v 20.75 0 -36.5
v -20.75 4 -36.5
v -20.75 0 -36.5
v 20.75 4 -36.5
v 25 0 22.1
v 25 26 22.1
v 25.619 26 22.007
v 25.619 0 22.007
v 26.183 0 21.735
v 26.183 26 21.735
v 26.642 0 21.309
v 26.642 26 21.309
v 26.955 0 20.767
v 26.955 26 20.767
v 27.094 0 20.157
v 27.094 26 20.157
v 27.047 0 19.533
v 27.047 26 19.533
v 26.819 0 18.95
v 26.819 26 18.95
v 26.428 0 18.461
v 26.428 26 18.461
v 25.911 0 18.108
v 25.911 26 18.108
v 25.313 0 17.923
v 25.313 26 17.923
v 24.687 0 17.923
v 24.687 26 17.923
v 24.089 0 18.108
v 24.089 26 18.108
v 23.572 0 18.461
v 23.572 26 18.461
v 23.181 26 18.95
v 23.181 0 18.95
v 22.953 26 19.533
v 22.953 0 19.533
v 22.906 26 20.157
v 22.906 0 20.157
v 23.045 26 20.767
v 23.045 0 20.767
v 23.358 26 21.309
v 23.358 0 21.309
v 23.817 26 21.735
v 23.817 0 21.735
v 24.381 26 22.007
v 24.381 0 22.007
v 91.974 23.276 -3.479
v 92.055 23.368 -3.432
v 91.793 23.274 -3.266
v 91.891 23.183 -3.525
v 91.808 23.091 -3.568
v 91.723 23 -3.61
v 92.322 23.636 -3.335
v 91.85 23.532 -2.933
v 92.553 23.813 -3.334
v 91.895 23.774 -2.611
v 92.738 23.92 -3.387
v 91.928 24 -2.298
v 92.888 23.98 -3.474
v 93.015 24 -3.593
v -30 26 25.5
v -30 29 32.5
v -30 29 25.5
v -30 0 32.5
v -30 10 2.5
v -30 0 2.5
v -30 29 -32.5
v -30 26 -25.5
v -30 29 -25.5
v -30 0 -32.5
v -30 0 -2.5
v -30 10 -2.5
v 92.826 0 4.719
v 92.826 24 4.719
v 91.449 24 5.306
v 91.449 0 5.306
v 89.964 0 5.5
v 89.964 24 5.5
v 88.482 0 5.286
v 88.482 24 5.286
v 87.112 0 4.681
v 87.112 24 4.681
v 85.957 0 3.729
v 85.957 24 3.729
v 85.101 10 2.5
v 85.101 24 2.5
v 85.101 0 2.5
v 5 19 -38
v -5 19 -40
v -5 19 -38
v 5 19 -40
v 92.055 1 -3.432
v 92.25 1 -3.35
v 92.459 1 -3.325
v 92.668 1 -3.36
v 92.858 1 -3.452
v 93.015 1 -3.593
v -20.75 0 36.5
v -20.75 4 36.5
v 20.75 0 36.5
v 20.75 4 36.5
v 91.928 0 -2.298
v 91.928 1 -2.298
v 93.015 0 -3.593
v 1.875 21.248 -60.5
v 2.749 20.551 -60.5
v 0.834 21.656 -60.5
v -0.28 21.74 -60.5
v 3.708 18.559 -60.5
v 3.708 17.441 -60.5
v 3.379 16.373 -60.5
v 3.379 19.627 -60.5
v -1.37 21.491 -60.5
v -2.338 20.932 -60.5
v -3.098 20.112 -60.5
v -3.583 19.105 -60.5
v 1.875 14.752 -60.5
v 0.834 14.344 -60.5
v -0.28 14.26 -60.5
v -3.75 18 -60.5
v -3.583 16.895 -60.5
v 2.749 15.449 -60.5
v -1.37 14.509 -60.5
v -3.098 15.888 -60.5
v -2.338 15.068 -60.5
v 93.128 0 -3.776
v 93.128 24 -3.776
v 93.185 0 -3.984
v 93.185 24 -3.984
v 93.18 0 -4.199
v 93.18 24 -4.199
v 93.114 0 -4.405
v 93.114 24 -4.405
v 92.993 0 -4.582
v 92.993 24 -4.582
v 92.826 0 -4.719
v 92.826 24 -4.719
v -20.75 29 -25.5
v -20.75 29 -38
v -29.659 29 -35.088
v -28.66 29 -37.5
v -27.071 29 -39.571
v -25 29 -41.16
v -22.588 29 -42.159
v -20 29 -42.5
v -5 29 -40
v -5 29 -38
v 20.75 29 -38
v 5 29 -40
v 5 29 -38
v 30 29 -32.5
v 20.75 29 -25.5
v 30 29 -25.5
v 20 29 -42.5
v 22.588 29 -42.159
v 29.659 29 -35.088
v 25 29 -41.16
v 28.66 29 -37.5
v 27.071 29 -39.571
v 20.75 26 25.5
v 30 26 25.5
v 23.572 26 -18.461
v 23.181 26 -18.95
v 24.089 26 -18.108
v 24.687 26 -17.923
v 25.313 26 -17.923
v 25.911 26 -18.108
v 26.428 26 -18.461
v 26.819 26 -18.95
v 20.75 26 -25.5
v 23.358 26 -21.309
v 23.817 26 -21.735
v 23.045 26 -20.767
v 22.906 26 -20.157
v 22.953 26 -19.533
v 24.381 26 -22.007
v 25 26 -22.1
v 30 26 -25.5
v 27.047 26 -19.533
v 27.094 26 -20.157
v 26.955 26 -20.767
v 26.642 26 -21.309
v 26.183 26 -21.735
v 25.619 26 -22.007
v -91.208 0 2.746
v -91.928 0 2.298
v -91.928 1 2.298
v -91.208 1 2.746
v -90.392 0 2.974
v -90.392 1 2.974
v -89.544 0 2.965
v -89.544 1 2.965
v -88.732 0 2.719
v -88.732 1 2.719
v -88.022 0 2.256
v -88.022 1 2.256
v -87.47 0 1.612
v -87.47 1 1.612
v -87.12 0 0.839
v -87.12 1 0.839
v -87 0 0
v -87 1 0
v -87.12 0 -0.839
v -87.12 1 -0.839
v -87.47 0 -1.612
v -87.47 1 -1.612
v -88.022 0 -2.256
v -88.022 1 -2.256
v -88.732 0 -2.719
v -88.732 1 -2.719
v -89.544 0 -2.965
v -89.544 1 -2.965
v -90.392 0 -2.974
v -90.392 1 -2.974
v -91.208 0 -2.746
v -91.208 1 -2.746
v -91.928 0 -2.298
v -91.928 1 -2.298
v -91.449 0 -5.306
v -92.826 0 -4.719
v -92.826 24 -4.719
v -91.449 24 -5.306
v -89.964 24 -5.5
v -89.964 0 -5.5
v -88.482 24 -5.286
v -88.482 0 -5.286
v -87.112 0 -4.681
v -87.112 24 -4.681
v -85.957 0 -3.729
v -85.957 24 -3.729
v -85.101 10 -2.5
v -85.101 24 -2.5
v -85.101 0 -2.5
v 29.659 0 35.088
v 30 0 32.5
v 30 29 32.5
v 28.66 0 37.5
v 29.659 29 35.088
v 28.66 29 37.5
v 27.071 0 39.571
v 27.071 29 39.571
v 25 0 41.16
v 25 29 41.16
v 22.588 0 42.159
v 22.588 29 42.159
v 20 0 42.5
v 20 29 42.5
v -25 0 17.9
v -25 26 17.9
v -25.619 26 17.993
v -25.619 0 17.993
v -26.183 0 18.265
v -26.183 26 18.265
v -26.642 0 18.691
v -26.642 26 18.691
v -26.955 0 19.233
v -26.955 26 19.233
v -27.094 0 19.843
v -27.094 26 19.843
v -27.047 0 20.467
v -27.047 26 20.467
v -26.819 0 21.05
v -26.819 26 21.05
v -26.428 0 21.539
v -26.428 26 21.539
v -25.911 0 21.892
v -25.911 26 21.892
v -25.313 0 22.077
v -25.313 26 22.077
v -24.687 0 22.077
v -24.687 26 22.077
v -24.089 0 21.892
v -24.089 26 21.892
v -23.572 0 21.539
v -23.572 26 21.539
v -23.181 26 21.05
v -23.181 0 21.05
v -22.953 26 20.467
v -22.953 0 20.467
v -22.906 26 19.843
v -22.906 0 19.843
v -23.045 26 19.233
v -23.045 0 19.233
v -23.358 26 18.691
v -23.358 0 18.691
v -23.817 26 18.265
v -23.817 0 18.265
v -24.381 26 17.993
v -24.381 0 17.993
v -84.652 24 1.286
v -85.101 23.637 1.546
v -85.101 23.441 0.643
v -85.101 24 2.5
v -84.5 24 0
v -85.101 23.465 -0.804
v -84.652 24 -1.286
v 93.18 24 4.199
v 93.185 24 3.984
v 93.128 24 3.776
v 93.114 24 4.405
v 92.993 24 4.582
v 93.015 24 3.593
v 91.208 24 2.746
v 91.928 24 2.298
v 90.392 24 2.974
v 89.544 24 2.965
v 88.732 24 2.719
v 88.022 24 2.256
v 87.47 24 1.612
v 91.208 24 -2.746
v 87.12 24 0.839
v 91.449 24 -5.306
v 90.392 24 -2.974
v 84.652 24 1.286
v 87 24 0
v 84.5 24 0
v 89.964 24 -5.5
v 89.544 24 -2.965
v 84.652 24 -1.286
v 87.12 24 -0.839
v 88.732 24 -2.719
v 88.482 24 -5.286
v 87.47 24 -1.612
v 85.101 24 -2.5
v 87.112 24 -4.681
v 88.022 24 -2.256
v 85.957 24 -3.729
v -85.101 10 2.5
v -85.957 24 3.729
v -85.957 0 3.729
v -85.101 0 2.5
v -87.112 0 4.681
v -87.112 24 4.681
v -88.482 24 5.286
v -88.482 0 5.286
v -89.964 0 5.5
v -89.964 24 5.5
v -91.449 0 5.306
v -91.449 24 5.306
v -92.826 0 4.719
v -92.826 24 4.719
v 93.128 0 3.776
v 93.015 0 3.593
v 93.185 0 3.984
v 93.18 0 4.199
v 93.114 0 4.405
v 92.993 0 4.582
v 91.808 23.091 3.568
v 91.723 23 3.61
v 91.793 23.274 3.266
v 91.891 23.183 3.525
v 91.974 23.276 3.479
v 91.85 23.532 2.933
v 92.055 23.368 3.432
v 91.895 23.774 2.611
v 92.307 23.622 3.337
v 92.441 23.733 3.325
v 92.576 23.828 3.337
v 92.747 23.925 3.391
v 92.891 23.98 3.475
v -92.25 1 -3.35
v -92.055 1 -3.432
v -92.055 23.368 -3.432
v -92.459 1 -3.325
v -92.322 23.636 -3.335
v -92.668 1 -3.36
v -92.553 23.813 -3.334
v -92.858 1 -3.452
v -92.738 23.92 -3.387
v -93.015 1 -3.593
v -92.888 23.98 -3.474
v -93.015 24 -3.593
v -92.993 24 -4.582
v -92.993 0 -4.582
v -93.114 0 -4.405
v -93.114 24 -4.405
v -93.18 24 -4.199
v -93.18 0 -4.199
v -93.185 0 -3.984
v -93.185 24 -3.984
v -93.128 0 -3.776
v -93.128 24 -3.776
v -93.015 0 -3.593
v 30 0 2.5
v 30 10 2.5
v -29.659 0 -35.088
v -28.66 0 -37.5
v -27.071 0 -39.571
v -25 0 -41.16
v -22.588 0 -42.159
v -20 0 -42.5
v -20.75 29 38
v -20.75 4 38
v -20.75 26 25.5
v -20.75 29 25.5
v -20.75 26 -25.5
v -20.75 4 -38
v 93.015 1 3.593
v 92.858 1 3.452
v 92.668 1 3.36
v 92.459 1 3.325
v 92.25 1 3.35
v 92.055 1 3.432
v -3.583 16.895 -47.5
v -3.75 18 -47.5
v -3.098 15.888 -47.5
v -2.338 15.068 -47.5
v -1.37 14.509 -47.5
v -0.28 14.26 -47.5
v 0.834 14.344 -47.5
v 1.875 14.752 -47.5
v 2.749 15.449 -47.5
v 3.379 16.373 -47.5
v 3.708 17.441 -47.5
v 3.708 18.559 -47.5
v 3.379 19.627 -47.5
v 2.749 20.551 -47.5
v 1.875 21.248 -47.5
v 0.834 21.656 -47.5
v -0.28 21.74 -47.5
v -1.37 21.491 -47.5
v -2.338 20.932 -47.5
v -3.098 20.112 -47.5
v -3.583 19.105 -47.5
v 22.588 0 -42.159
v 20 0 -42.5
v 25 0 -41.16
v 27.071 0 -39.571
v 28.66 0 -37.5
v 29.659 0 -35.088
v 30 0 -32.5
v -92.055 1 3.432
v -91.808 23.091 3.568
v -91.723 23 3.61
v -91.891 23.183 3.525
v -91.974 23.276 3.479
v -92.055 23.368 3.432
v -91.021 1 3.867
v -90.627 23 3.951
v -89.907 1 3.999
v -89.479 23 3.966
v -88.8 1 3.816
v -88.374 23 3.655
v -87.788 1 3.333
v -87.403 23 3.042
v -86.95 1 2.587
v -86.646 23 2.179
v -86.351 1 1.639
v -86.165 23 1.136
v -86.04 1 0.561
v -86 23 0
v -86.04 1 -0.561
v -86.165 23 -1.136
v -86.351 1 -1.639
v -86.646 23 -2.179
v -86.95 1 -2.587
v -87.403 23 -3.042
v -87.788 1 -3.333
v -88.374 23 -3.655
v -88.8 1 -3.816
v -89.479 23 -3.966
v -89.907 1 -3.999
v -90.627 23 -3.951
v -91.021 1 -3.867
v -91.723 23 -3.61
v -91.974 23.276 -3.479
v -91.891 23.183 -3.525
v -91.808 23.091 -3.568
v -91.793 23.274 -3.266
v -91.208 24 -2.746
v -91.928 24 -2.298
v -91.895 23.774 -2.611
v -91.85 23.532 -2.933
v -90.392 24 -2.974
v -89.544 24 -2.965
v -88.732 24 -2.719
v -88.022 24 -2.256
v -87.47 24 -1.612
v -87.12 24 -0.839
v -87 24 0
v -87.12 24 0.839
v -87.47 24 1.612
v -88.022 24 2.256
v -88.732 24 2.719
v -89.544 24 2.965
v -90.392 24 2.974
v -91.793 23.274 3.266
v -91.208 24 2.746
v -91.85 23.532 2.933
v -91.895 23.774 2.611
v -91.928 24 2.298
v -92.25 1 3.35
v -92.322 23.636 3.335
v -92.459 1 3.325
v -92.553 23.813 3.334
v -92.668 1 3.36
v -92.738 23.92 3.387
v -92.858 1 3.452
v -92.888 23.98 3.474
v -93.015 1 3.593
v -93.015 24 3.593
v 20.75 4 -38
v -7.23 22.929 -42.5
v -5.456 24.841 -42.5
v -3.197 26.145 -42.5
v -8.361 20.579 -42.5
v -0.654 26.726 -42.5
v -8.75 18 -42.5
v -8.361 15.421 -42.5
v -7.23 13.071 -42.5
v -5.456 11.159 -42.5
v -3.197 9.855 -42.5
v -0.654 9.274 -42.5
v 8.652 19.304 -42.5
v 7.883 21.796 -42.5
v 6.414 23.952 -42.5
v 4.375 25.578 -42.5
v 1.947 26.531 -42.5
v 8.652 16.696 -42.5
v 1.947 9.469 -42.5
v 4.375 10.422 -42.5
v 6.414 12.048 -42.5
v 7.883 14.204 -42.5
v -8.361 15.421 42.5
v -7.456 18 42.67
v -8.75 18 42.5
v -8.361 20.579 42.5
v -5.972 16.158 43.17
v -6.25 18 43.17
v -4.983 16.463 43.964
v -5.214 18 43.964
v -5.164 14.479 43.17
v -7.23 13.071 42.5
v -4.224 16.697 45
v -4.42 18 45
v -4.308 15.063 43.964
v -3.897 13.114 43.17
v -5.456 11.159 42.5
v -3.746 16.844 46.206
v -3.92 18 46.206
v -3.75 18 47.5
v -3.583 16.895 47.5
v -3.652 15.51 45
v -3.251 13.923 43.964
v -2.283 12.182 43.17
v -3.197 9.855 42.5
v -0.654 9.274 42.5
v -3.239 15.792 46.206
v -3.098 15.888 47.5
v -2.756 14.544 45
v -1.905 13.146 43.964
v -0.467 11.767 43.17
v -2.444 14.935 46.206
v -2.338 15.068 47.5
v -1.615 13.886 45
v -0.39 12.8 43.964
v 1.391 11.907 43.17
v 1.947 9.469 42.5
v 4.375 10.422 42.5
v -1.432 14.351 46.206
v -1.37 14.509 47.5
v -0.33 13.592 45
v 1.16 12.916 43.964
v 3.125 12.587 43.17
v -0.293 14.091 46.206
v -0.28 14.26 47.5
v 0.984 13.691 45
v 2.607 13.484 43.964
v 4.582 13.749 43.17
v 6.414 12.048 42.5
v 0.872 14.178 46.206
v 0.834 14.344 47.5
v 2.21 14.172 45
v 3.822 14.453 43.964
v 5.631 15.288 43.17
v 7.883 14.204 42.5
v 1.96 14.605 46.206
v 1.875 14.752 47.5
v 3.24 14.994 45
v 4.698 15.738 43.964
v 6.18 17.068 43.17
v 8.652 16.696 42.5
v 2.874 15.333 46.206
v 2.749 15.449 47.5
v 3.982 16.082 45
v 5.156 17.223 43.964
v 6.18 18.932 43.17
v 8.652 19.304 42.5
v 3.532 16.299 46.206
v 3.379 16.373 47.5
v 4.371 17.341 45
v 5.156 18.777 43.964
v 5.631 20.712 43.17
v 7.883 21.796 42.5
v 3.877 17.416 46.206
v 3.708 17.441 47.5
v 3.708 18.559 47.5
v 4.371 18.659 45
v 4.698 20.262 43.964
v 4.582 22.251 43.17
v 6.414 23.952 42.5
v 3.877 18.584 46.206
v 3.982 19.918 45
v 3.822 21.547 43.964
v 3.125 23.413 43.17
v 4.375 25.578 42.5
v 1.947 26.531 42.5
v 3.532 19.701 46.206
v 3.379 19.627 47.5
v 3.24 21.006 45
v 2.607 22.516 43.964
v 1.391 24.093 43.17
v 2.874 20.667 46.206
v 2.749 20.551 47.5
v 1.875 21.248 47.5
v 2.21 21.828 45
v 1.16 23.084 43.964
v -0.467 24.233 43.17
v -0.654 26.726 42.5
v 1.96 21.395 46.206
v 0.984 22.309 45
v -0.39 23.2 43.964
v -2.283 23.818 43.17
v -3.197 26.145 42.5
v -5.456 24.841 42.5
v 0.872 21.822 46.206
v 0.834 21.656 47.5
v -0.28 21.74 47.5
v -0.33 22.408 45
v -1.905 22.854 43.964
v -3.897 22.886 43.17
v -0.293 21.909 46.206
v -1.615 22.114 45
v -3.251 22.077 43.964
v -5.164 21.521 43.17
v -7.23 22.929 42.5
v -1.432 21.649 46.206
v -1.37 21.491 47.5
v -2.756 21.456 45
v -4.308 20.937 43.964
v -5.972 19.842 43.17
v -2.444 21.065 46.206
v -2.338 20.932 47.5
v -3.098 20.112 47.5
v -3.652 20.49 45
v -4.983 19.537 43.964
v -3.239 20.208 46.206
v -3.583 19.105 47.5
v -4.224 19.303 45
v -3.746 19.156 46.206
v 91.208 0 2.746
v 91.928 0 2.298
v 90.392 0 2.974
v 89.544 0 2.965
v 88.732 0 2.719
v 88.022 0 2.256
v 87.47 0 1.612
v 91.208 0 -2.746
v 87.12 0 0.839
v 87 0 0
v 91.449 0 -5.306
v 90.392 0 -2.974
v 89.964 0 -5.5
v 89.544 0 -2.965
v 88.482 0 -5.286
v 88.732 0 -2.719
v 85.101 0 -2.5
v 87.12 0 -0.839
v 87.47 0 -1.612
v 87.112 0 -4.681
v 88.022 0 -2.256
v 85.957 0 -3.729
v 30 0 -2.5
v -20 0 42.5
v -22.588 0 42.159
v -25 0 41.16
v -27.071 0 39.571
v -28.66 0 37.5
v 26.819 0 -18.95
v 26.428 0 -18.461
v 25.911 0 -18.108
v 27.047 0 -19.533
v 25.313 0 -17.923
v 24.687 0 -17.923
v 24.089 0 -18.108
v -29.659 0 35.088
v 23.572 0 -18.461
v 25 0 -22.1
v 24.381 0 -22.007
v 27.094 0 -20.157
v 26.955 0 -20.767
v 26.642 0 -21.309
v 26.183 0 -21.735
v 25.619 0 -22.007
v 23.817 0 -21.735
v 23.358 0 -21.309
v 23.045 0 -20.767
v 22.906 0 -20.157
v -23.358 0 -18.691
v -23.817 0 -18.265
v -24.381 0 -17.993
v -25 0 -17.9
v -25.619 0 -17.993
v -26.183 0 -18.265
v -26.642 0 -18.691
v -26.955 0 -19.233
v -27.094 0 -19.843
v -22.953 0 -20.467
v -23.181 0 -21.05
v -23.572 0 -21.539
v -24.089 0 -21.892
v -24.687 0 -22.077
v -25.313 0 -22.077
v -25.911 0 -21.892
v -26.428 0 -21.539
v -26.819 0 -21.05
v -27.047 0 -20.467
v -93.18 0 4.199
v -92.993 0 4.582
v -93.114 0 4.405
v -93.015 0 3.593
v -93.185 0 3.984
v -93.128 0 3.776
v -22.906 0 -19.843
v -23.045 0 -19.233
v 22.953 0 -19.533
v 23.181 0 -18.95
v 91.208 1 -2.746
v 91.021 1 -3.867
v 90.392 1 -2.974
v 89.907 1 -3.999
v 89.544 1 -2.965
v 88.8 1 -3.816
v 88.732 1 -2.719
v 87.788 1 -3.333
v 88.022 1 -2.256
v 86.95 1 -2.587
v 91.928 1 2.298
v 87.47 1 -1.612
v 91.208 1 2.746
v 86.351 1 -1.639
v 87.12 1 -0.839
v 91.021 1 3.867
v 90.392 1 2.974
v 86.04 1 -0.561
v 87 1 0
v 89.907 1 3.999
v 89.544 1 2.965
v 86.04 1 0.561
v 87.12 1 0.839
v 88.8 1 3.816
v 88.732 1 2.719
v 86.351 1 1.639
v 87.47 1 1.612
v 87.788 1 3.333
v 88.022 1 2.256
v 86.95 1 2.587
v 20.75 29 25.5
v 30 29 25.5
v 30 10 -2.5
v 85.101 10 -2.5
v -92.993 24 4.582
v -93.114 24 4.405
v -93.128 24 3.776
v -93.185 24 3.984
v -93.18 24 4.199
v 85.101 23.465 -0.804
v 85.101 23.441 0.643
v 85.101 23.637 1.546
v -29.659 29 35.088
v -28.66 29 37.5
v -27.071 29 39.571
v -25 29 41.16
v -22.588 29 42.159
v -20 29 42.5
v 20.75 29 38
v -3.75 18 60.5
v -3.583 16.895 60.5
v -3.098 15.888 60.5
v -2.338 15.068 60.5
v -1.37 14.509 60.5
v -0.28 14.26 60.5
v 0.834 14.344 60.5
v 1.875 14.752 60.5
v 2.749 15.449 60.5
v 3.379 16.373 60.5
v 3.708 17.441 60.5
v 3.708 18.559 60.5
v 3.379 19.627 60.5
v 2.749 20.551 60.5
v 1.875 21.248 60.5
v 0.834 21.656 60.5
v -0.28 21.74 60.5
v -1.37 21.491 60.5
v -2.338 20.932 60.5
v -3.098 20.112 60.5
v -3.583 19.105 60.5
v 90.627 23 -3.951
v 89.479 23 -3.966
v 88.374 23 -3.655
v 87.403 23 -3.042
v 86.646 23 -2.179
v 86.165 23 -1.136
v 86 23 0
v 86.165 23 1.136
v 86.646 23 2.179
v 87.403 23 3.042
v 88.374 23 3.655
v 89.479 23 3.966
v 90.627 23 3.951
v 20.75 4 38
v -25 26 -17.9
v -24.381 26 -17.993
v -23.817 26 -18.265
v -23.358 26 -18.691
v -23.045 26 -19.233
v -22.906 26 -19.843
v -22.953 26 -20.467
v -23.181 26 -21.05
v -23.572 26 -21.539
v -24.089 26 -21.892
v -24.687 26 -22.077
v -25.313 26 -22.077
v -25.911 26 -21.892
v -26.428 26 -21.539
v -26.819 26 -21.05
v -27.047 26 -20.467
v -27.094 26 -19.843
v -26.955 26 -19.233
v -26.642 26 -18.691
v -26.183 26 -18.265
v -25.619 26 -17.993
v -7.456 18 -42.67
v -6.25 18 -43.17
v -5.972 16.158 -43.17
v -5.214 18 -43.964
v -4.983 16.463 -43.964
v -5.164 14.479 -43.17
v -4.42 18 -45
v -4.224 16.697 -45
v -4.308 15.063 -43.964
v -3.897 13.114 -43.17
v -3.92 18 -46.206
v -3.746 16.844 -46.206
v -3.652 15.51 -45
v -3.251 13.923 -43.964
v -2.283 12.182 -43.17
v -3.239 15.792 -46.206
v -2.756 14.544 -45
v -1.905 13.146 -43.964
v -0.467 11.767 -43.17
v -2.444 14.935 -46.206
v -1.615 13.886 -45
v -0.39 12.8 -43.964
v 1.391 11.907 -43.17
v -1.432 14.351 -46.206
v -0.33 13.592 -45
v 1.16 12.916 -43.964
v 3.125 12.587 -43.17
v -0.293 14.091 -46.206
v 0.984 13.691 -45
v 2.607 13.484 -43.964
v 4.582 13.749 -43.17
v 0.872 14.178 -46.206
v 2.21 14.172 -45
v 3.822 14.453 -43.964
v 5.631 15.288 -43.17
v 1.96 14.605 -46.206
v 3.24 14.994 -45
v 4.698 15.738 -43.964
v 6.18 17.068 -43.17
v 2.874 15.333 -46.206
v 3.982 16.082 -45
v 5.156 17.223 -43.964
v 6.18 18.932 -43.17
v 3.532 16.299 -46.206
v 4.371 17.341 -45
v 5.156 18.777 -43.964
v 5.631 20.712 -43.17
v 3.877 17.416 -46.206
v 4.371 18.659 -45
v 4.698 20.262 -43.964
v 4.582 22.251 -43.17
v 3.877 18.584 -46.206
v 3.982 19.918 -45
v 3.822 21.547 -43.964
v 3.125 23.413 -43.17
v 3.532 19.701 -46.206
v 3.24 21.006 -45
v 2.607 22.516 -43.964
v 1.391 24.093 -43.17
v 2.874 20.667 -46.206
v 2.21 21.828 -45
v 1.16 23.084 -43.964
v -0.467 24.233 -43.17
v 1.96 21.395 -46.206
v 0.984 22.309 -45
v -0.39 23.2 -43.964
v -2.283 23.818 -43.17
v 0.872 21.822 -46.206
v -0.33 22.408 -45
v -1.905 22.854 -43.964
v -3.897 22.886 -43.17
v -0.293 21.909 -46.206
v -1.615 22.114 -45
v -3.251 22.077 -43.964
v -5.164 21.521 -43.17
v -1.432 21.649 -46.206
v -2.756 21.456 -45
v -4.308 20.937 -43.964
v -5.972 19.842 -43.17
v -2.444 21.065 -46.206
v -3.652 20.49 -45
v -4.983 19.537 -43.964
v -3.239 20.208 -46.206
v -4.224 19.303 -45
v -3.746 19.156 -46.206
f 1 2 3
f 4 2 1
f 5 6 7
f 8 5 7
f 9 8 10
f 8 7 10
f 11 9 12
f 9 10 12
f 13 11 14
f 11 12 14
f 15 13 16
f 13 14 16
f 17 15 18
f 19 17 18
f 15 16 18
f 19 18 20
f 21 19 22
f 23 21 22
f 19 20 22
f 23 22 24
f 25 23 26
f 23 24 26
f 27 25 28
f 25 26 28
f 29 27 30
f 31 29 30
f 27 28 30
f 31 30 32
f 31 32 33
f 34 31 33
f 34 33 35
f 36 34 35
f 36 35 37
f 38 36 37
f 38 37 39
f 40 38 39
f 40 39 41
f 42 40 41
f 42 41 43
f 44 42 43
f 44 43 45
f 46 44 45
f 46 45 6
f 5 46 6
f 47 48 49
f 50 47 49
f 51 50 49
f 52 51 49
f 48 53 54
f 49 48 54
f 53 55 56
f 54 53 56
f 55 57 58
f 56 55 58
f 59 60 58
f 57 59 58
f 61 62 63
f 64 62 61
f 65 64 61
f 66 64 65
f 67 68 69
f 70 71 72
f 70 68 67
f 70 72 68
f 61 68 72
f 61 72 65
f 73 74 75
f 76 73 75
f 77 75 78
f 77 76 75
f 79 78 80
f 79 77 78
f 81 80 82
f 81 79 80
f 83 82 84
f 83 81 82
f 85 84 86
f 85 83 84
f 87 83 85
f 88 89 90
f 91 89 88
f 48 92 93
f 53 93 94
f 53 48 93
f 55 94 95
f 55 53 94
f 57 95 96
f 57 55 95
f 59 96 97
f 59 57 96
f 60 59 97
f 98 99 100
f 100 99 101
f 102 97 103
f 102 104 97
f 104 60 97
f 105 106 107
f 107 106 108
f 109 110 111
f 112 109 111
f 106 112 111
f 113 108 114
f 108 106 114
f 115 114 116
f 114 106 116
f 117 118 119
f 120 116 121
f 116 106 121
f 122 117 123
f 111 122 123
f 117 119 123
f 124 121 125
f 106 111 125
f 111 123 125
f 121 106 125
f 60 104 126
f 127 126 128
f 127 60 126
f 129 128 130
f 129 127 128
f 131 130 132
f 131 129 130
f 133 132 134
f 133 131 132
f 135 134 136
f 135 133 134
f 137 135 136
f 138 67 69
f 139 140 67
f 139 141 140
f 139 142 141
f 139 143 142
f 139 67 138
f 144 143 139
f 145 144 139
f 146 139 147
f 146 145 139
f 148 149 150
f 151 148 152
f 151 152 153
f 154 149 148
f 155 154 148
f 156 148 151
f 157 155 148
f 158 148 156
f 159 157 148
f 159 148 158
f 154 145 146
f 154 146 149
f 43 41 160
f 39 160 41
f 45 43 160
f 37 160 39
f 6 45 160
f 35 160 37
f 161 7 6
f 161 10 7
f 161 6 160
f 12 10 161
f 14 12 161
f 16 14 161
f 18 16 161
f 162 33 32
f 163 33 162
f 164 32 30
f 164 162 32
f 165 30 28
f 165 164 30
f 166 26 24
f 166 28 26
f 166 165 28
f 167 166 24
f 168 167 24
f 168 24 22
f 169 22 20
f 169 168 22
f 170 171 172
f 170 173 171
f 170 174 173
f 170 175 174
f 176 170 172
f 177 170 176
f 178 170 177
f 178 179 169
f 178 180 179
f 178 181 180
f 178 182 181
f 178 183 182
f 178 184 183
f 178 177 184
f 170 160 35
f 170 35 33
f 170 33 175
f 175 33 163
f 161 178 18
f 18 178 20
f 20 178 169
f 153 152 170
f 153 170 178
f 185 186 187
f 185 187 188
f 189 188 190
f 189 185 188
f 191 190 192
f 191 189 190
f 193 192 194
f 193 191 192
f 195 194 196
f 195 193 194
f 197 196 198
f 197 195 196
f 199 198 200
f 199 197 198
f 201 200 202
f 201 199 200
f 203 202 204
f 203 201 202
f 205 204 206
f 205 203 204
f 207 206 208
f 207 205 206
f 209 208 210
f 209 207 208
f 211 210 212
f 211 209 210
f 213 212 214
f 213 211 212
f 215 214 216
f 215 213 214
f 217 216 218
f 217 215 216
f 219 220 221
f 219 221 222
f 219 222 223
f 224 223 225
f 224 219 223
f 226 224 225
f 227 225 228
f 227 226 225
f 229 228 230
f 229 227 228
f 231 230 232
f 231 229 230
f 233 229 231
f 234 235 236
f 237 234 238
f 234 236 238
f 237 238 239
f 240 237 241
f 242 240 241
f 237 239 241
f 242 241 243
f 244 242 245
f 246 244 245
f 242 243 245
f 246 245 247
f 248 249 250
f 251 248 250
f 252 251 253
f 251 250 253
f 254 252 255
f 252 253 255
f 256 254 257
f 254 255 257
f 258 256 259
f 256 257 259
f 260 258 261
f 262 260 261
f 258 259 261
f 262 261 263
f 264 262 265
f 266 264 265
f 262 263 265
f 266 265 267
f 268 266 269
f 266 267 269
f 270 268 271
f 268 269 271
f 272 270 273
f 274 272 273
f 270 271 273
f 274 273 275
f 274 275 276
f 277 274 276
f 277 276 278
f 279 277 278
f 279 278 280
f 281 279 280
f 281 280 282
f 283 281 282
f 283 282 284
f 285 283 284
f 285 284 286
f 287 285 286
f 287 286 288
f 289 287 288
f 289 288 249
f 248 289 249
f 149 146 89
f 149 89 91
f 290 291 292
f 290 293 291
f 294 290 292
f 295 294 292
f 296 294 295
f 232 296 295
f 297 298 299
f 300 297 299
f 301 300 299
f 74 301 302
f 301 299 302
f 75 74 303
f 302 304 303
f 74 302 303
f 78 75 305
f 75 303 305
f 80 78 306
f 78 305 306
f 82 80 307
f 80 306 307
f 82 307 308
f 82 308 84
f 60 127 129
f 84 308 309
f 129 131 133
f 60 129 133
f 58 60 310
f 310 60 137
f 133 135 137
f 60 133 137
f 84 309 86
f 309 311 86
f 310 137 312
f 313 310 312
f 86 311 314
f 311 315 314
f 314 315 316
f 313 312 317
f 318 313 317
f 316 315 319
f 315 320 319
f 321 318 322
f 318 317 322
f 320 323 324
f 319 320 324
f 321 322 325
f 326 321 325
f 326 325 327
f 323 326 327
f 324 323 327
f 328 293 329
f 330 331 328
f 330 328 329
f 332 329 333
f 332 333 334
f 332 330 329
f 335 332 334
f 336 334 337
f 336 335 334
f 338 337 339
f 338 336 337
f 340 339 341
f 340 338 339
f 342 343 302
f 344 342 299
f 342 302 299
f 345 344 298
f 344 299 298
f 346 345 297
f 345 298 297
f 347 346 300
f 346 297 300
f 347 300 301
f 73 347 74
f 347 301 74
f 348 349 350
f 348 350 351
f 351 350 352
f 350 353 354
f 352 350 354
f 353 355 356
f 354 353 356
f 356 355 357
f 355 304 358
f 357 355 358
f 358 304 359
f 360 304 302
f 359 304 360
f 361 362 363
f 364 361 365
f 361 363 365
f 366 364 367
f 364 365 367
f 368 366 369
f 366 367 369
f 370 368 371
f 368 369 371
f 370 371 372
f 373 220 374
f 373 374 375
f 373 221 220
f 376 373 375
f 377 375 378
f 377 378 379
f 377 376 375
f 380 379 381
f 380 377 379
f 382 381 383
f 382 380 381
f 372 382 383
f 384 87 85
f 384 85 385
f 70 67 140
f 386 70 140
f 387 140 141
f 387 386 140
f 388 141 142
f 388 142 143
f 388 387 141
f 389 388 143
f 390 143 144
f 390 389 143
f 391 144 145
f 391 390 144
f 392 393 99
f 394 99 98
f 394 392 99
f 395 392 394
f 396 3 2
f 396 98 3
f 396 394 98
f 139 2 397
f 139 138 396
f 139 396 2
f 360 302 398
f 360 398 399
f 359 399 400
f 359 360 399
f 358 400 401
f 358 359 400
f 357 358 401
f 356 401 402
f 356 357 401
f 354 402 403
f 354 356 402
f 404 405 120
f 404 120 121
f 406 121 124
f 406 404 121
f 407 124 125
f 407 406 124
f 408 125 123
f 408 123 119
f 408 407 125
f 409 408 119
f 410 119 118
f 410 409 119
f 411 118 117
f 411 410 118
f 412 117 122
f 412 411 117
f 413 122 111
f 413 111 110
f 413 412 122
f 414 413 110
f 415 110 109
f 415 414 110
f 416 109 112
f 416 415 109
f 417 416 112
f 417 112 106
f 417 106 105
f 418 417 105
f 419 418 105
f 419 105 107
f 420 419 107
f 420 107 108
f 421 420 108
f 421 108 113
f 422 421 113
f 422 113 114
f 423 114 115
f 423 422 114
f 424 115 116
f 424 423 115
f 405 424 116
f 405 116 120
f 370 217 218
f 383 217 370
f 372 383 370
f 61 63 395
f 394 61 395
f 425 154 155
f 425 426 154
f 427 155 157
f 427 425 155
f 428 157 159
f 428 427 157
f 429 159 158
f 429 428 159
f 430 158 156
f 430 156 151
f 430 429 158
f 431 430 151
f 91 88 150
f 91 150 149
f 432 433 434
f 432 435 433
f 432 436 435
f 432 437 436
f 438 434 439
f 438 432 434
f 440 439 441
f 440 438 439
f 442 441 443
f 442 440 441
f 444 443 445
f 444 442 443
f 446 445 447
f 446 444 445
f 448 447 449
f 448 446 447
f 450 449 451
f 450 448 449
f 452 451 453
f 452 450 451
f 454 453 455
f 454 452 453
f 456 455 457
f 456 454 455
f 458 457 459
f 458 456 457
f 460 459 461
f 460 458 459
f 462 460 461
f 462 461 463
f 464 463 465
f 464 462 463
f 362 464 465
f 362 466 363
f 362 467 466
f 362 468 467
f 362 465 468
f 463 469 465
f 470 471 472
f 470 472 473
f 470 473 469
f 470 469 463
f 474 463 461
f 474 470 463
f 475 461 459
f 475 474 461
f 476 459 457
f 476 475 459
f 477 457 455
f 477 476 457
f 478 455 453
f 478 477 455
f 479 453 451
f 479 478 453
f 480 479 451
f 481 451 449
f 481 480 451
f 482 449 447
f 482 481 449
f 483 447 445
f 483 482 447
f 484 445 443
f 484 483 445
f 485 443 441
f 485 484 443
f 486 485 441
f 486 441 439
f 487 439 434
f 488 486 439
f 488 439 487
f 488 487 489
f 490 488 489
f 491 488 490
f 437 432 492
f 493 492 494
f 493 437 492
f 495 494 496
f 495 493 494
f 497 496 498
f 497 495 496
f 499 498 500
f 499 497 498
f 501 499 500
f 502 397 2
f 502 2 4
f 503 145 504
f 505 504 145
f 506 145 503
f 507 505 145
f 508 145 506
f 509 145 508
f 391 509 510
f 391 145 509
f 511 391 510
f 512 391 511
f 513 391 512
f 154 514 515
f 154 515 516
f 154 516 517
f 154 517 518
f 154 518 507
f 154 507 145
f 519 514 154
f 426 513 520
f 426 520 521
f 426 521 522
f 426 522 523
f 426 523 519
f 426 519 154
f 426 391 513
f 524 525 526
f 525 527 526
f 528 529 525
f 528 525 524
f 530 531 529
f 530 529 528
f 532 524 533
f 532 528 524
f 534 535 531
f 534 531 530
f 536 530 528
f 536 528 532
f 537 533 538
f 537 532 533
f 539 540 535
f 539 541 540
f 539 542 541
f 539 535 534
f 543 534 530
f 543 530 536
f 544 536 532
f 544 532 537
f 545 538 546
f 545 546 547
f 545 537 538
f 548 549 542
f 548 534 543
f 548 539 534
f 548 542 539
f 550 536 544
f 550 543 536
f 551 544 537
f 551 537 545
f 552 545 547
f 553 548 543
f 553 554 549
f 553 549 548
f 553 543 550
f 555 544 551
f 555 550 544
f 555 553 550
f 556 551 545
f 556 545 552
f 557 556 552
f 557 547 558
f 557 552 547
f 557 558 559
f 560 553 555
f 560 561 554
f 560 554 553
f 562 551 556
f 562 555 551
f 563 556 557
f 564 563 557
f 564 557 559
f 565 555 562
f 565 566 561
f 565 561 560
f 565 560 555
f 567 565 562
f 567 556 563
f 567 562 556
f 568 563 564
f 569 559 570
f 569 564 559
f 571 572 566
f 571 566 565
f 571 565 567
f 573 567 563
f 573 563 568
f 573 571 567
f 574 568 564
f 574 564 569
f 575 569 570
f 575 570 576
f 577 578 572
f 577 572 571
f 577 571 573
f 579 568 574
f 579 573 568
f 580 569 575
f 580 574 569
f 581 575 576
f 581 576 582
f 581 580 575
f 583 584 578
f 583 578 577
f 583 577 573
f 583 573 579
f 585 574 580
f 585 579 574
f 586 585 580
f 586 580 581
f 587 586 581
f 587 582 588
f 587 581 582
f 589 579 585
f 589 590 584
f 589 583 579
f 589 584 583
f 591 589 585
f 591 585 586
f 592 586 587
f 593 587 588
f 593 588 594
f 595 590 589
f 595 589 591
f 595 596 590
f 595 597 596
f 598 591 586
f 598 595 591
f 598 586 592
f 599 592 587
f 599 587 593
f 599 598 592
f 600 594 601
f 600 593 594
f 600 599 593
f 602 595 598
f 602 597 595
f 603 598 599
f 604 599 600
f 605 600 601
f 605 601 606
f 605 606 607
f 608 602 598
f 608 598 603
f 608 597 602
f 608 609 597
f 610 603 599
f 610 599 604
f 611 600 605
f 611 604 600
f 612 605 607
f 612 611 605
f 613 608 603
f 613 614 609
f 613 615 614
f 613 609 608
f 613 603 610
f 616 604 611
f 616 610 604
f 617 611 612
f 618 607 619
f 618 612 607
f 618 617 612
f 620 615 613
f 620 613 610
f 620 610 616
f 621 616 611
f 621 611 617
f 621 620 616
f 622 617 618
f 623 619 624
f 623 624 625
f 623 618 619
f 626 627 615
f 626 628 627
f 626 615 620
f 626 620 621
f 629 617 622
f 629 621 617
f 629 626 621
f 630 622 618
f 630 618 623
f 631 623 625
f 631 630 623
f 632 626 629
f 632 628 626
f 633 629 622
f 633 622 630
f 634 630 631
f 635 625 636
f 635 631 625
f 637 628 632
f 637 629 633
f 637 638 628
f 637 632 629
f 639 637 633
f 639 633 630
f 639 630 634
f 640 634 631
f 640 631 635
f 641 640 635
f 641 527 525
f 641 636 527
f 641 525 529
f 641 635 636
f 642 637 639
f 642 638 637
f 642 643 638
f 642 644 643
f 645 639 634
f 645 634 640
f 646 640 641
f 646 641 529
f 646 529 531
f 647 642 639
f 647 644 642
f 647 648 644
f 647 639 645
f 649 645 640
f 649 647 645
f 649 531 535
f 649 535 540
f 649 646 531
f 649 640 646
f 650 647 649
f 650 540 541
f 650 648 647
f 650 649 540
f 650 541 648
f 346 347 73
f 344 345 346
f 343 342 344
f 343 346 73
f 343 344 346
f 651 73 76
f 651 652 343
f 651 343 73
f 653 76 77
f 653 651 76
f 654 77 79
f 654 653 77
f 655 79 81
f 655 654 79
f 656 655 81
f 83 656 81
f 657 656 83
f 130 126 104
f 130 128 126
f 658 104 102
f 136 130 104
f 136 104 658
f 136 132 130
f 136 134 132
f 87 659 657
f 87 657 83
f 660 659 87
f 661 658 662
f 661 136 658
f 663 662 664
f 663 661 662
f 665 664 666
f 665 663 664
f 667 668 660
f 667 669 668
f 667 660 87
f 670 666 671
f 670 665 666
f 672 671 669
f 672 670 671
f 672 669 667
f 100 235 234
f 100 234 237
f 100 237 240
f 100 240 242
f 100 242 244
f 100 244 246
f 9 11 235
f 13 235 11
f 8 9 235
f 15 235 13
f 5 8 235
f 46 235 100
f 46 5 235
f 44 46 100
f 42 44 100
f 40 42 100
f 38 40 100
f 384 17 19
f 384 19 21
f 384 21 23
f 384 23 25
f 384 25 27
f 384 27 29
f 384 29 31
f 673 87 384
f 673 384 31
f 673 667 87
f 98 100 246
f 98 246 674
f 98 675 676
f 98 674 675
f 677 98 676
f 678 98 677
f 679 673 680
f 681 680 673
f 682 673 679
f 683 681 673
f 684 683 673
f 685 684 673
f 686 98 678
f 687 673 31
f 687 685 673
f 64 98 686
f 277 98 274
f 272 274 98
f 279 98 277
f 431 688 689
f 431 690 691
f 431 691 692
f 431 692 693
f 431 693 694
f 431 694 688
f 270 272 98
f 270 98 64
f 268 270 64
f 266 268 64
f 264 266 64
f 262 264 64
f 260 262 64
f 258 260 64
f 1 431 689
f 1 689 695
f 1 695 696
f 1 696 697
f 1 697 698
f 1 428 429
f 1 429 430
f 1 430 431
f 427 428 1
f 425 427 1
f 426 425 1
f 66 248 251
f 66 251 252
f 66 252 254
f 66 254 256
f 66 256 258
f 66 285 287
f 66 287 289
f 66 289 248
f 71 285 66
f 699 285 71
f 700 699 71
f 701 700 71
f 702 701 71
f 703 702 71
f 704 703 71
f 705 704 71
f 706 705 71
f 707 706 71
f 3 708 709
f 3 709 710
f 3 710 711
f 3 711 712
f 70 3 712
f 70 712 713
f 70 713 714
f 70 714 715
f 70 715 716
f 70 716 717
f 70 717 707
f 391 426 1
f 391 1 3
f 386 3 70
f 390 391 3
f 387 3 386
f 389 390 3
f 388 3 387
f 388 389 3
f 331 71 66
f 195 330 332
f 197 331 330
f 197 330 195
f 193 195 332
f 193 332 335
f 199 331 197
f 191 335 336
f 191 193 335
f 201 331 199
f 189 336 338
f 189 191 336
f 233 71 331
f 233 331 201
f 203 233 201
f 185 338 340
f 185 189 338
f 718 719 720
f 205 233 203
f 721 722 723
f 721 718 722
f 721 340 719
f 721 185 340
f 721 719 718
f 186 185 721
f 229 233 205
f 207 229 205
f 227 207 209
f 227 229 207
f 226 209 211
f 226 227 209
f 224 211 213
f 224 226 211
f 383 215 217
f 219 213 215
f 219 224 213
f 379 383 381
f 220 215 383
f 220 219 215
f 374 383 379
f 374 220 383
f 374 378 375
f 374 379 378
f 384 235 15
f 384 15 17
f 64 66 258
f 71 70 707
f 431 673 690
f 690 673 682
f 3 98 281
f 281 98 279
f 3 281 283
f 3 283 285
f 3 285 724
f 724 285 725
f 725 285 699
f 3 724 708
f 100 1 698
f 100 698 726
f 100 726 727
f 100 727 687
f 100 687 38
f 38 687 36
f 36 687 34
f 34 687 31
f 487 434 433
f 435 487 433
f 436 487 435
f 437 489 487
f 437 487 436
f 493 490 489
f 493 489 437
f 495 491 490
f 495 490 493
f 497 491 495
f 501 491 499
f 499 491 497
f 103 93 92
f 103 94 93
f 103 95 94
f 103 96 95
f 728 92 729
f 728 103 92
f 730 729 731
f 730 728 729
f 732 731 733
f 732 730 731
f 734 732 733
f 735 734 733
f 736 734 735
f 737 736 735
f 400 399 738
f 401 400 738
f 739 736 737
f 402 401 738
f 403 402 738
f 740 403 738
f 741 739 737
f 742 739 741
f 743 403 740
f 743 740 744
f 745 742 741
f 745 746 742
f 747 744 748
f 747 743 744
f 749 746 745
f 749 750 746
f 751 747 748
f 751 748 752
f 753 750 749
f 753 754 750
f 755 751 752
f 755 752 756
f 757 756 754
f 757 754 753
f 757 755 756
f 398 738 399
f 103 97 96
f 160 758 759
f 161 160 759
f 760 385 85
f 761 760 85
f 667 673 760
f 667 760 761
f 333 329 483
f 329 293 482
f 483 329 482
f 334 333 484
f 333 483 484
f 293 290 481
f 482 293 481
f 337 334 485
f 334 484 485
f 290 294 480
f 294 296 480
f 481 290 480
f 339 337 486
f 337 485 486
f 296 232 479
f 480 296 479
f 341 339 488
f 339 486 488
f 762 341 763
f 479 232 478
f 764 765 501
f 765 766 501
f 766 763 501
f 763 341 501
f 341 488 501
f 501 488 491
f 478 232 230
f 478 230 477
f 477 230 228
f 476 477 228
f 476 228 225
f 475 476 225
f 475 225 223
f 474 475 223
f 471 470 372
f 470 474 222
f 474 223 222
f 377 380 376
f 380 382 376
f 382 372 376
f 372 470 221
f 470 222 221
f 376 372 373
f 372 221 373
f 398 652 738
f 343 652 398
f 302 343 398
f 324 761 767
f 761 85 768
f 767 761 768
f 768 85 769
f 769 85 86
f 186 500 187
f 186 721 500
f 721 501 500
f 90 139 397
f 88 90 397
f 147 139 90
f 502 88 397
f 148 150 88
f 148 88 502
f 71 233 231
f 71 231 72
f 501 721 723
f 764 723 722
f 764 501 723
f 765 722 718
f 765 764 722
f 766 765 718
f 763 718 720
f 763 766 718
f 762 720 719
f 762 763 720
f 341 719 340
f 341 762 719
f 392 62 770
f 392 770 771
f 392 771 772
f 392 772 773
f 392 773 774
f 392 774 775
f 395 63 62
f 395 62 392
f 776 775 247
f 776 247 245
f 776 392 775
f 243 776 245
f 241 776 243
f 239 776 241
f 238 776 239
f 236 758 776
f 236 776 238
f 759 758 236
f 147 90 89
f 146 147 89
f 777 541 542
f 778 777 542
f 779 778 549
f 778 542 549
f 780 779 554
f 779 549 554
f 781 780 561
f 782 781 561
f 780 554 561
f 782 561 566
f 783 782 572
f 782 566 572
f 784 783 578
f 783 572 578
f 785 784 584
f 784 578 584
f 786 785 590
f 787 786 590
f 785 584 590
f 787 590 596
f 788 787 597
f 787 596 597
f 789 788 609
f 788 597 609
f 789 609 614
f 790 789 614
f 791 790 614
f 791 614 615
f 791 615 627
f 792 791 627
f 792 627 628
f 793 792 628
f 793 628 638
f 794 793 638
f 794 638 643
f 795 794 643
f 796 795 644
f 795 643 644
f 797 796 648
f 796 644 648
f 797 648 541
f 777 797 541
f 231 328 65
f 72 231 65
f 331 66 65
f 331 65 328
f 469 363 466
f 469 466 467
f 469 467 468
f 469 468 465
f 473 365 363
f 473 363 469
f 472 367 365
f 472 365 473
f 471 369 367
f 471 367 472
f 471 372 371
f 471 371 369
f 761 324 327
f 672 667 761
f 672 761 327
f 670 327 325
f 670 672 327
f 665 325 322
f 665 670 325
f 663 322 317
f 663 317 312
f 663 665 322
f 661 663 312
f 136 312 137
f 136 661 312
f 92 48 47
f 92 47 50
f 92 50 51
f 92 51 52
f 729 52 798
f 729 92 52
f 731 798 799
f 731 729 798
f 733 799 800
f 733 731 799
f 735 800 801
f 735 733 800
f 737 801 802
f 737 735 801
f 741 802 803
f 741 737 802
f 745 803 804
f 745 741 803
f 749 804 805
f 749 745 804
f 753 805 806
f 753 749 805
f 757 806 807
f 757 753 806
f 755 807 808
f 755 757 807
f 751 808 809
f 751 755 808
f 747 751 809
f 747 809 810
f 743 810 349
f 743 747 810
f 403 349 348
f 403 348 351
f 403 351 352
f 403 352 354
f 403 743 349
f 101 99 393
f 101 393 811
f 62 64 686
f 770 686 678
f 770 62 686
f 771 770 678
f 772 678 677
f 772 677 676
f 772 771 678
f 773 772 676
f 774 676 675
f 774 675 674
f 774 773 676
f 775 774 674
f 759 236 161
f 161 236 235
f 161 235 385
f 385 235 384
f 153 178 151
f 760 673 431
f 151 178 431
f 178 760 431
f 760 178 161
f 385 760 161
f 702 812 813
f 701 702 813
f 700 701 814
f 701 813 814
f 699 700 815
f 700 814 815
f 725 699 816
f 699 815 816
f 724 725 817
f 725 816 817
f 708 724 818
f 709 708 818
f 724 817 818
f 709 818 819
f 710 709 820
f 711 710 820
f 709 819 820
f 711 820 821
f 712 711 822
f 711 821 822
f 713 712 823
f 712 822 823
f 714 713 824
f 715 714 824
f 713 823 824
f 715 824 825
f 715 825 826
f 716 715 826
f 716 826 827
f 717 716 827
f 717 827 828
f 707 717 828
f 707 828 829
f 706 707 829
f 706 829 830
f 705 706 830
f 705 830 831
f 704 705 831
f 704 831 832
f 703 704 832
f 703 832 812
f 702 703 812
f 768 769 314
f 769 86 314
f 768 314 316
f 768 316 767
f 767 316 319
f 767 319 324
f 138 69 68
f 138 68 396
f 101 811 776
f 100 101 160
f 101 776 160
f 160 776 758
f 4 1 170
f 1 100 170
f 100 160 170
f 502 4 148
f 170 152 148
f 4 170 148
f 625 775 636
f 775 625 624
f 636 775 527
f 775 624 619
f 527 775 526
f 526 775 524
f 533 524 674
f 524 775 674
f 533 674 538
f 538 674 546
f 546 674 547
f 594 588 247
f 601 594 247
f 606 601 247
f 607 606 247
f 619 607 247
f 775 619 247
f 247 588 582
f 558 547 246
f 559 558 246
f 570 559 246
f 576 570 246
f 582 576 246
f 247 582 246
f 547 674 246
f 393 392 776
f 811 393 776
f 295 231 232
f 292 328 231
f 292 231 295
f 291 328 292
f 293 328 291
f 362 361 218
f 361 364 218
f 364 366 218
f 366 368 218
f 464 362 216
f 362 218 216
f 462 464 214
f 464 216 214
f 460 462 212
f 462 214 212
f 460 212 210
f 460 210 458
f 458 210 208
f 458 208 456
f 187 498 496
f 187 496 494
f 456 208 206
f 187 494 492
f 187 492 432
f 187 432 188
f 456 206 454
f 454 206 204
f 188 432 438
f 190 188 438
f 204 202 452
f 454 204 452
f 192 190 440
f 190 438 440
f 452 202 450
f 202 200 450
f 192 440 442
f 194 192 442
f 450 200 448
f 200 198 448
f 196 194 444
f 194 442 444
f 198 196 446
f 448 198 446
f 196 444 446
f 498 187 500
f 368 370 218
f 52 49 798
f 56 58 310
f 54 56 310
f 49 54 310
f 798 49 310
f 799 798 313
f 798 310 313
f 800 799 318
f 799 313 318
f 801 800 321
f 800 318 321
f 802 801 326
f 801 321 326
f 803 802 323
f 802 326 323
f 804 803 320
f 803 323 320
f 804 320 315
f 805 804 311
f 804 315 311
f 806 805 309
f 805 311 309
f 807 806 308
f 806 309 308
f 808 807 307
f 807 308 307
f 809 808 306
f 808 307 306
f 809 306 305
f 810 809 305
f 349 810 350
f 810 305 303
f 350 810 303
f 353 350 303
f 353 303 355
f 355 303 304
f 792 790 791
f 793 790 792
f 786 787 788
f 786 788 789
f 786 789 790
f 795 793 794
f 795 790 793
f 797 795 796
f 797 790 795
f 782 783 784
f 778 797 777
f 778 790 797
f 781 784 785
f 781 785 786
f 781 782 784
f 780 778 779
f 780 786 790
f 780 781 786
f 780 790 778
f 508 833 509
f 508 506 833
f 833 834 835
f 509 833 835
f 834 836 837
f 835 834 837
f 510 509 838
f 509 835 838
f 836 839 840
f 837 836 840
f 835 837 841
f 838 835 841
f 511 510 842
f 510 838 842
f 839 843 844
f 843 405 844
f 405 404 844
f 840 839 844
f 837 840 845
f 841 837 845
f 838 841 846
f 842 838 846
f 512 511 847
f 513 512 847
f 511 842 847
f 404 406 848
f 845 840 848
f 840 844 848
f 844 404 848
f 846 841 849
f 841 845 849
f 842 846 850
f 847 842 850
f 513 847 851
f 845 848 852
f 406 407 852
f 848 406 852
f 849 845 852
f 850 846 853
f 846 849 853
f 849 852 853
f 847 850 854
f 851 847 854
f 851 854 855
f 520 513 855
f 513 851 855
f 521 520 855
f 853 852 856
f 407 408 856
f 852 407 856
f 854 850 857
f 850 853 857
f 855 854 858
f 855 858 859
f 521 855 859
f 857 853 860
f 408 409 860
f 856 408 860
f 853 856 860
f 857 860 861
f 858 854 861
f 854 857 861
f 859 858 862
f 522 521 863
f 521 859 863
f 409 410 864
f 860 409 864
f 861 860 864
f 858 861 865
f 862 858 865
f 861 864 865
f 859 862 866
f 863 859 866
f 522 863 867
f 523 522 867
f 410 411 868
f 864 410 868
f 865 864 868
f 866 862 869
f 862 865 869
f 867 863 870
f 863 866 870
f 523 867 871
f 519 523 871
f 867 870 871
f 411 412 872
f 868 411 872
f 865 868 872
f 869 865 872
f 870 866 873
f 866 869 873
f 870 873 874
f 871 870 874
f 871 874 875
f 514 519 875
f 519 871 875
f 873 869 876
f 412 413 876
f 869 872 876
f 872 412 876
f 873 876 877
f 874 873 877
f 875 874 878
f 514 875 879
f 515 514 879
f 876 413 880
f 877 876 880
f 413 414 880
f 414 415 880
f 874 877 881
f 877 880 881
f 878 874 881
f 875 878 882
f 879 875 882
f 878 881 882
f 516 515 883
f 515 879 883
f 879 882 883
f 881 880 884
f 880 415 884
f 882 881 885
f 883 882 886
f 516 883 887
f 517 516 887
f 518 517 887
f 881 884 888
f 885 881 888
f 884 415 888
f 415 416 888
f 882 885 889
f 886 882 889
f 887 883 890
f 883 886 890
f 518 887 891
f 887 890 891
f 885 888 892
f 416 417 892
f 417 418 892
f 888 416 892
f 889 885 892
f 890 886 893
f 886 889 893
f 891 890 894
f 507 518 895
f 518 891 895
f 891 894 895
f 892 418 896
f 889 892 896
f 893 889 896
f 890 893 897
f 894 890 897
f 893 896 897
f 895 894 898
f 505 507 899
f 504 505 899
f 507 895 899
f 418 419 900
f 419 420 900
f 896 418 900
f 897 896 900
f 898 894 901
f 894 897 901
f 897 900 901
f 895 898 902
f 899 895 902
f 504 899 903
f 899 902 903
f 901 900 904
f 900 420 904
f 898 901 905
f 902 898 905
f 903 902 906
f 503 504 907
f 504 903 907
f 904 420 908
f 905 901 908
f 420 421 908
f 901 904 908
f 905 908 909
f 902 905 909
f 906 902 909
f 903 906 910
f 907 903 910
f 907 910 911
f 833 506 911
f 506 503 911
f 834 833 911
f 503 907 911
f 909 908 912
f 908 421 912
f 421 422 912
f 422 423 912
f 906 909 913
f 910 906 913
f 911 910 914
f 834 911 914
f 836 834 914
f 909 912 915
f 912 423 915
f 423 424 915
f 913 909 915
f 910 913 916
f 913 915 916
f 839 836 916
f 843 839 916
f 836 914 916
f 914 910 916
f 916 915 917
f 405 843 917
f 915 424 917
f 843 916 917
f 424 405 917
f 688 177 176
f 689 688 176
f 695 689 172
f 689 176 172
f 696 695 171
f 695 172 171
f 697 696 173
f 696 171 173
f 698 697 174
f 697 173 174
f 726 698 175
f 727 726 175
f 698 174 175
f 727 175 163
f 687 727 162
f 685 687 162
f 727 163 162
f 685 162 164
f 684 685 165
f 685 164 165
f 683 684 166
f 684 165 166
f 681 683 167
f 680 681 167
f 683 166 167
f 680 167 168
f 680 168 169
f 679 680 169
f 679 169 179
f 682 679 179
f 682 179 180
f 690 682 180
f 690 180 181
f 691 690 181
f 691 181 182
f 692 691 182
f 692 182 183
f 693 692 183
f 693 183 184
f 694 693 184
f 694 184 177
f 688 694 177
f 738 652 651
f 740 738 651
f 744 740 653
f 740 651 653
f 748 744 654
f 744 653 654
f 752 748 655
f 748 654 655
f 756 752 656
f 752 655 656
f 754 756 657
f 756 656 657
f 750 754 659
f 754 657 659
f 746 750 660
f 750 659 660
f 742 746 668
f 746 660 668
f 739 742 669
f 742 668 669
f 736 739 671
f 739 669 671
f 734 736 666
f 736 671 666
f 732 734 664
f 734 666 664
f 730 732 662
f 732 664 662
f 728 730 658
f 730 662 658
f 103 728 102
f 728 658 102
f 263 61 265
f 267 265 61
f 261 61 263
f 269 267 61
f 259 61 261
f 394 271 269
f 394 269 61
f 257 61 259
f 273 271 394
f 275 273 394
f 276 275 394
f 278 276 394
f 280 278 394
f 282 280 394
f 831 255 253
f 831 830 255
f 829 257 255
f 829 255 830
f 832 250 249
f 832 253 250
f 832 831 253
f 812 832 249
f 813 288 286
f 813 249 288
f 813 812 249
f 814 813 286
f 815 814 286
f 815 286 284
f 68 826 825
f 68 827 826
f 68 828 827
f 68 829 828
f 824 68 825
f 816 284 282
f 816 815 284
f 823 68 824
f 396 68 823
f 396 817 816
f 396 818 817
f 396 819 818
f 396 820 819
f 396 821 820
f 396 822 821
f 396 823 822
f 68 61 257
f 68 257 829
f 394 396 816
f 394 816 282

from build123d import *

# Parameters (mm, degrees)
BOSS_EXTRUDE1_DEPTH  = 24
SKETCH22_W           = 60.00000000000001
SKETCH22_H           = 85
BOSS_EXTRUDE6_DEPTH  = 5
SKETCH5_W            = 41.5
SKETCH5_H            = 76
CUT_EXTRUDE1_DEPTH   = 25
SKETCH17_W           = 60
SKETCH17_H           = 51
CUT_EXTRUDE10_DEPTH  = 3
SKETCH8_W            = 55.101020514433614
SKETCH8_H            = 14
CUT_EXTRUDE3_DEPTH   = 108.77225201740228
FILLET4_R            = 10
BOSS_EXTRUDE3_DEPTH  = 1
BOSS_EXTRUDE3_DRAFT  = -45.0000000000001
MIRROR6_COPY_1_DEPTH = 1
MIRROR6_COPY_1_DRAFT = -45.0000000000001
BOSS_EXTRUDE4_DEPTH  = 1
FILLET3_R            = 0.75
SKETCH15_R           = 2.100000000000001
CUT_EXTRUDE8_DEPTH   = 106.67266341818518
SKETCH20_W           = 41.499999999999986
SKETCH20_H           = 72.99999999999999
CUT_EXTRUDE11_DEPTH  = 5
SKETCH21_R           = 3.75
BOSS_EXTRUDE5_DEPTH  = 18
FILLET5_R            = 5
SKETCH24_W           = 10
SKETCH24_H           = 2
CUT_EXTRUDE12_DEPTH  = 10


with BuildPart() as part:
    # Sketch4 → Boss-Extrude1 (new body)
    with BuildSketch(Plane(origin=(0, 0, 0), x_dir=(1, 0, 0), z_dir=(0, 1, 0))):
        with BuildLine():
            Line((-30, 2.499999999999996), (-30, 42.5))
            Line((-30, 42.5), (30, 42.5))
            Line((30, 42.5), (30, 2.499999999999996))
            Line((30, 2.499999999999996), (85.10102051443361, 2.49999999999999))
            ThreePointArc((85.10102051443361, 2.49999999999999), (88.90515510613471, 5.389927147780134), (93.53533185327602, 4.213244437154374))
            Line((93.53533185327602, 4.213244437154374), (92.57115043874622, 3.064177772475905))
            ThreePointArc((92.57115043874622, 3.064177772475905), (86, -2.572e-14), (92.57115043874622, -3.0641777724758823))
            Line((92.57115043874622, -3.0641777724758823), (93.53533185327602, -4.213244437154351))
            ThreePointArc((93.53533185327602, -4.213244437154351), (88.90515510613471, -5.389927147780135), (85.10102051443361, -2.499999999999969))
            Line((85.10102051443361, -2.499999999999969), (30, -2.4999999999999893))
            Line((30, -2.4999999999999893), (30.00000000000001, -42.499999999999986))
            Line((30.00000000000001, -42.499999999999986), (-30.00000000000001, -42.499999999999986))
            Line((-30.00000000000001, -42.499999999999986), (-30, -2.4999999999999893))
            Line((-30, -2.4999999999999893), (-85.10102051443361, -2.499999999999969))
            ThreePointArc((-85.10102051443361, -2.499999999999969), (-88.90515510613471, -5.389927147780135), (-93.53533185327602, -4.213244437154351))
            Line((-93.53533185327602, -4.213244437154351), (-92.57115043874622, -3.0641777724758823))
            ThreePointArc((-92.57115043874622, -3.0641777724758823), (-86, -2.523e-14), (-92.57115043874622, 3.064177772475905))
            Line((-92.57115043874622, 3.064177772475905), (-93.53533185327602, 4.213244437154374))
            ThreePointArc((-93.53533185327602, 4.213244437154374), (-88.90515510613471, 5.389927147780134), (-85.10102051443361, 2.49999999999999))
            Line((-85.10102051443361, 2.49999999999999), (-30, 2.499999999999996))
        make_face()
    extrude(amount=BOSS_EXTRUDE1_DEPTH)

    # Sketch22 → Boss-Extrude6 (add)
    with BuildSketch(Plane(origin=(0, 24, 0), x_dir=(1, 0, 0), z_dir=(0, 1, 0))):
        Rectangle(SKETCH22_W, SKETCH22_H)
    extrude(amount=BOSS_EXTRUDE6_DEPTH)

    # Sketch5 → Cut-Extrude1 (cut)
    with BuildSketch(Plane(origin=(0, 29, 0), x_dir=(1, 0, 0), z_dir=(0, 1, 0))):
        Rectangle(SKETCH5_W, SKETCH5_H)
    extrude(amount=-CUT_EXTRUDE1_DEPTH, mode=Mode.SUBTRACT)

    # Sketch17 → Cut-Extrude10 (cut)
    with BuildSketch(Plane(origin=(0, 29, 0), x_dir=(1, 0, 0), z_dir=(0, 1, 0))):
        Rectangle(SKETCH17_W, SKETCH17_H)
    extrude(amount=-CUT_EXTRUDE10_DEPTH, mode=Mode.SUBTRACT)

    # Sketch8 → Cut-Extrude3 (cut, through all)
    with BuildSketch(Plane.XY.offset(2.5000000000000004)):
        with Locations((-57.55051025721681, 17)):
            Rectangle(SKETCH8_W, SKETCH8_H)
        with Locations((57.55051025721681, 17)):
            Rectangle(SKETCH8_W, SKETCH8_H)
    extrude(amount=-CUT_EXTRUDE3_DEPTH, mode=Mode.SUBTRACT)

    # Fillet4
    fillet4_edges = [part.edges().sort_by_distance(p)[0] for p in [
        (-30, 14.5, -42.5),
        (30, 14.5, -42.5),
        (30.000000000000007, 14.5, 42.49999999999999),
        (-30.000000000000007, 14.5, 42.49999999999999),
    ]]
    fillet(fillet4_edges, radius=FILLET4_R)


with BuildPart() as boss_extrude3_tool:
    # Sketch11 → Boss-Extrude3 (with draft: the straight prism first)
    with BuildSketch(Plane(origin=(0, 24, 0), x_dir=(1, 0, 0), z_dir=(0, 1, 0))):
        with BuildLine():
            Line((-93.535331853276, 4.21324443715433), (-91.92836282905964, 2.2981333293569084))
            ThreePointArc((-91.92836282905964, 2.2981333293569084), (-87.00000000000001, -1.768e-14), (-91.92836282905964, -2.2981333293569084))
            Line((-91.92836282905964, -2.2981333293569084), (-93.535331853276, -4.21324443715433))
            ThreePointArc((-93.535331853276, -4.21324443715433), (-84.50000000000001, -1.835e-14), (-93.535331853276, 4.21324443715433))
        make_face()
    extrude(amount=-BOSS_EXTRUDE3_DEPTH)
    # Boss-Extrude3: the draft: its side faces are tilted about the plane it starts from
    boss_extrude3_sides = [boss_extrude3_tool.faces().sort_by_distance(p)[0] for p in [
        (-92.731847341, 23.5, -3.255688883),
        (-87, 23.5, 0),
        (-92.731847341, 23.5, 3.255688883),
        (-84.5, 23.5, 0),
    ]]
    draft(boss_extrude3_sides, Plane(origin=(0, 24, 0), x_dir=(1, 0, 0), z_dir=(0, 1, 0)), BOSS_EXTRUDE3_DRAFT)


with BuildPart() as part_1:
    add(part.part)

    # Boss-Extrude3: add boss_extrude3_tool
    add(boss_extrude3_tool.part)


with BuildPart() as mirror6_copy_1_tool:
    # Mirror6 copy 1 sketch → Mirror6 copy 1 (with draft: the straight prism first)
    with BuildSketch(Plane(origin=(0, 24, 0), x_dir=(-1, 0, 0), z_dir=(0, 1, 0))):
        with BuildLine():
            Line((-93.535331853276, -4.21324443715433), (-91.92836282905964, -2.2981333293569084))
            ThreePointArc((-91.92836282905964, -2.2981333293569084), (-87.00000000000001, 1.768e-14), (-91.92836282905964, 2.2981333293569084))
            Line((-91.92836282905964, 2.2981333293569084), (-93.535331853276, 4.21324443715433))
            ThreePointArc((-93.535331853276, 4.21324443715433), (-84.50000000000001, 1.835e-14), (-93.535331853276, -4.21324443715433))
        make_face()
    extrude(amount=-MIRROR6_COPY_1_DEPTH)
    # Mirror6 copy 1: the draft: its side faces are tilted about the plane it starts from
    mirror6_copy_1_sides = [mirror6_copy_1_tool.faces().sort_by_distance(p)[0] for p in [
        (92.731847341, 23.5, -3.255688883),
        (87, 23.5, 0),
        (92.731847341, 23.5, 3.255688883),
        (84.5, 23.5, 0),
    ]]
    draft(mirror6_copy_1_sides, Plane(origin=(0, 24, 0), x_dir=(-1, 0, 0), z_dir=(0, 1, 0)), MIRROR6_COPY_1_DRAFT)


with BuildPart() as part_2:
    add(part_1.part)

    # Mirror6 copy 1: add mirror6_copy_1_tool
    add(mirror6_copy_1_tool.part)

    # Sketch12 → Boss-Extrude4 (add)
    with BuildSketch(Plane.XZ):
        with BuildLine():
            Line((-93.53533185327602, 4.213244437154351), (-91.92836282905965, 2.2981333293569315))
            ThreePointArc((-91.92836282905965, 2.2981333293569315), (-87, 1.768e-14), (-91.92836282905964, -2.298133329356913))
            Line((-91.92836282905964, -2.298133329356913), (-93.53533185327602, -4.213244437154374))
            ThreePointArc((-93.53533185327602, -4.213244437154374), (-84.49999999999996, 2.568e-14), (-93.53533185327602, 4.213244437154351))
        make_face()
    boss_extrude4 = extrude(amount=-BOSS_EXTRUDE4_DEPTH)

    # Mirror5: Boss-Extrude4 across plane
    add(boss_extrude4.mirror(Plane(origin=(0, 0, 0), x_dir=(0, 0, 1), z_dir=(1, 0, 0))))

    # Fillet3
    fillet3_edges = [part_2.edges().sort_by_distance(p)[0] for p in [
        (93.535331853276, 12, 4.213244437154348),
        (92.57115043874622, 12.5, 3.064177772475879),
        (92.57115043874622, 12.5, -3.064177772475902),
        (93.535331853276, 12, -4.213244437154364),
        (-93.535331853276, 12, 4.213244437154348),
        (-92.57115043874622, 12.5, 3.064177772475879),
        (-93.535331853276, 12, -4.213244437154364),
        (-92.57115043874622, 12.5, -3.064177772475902),
    ]]
    fillet(fillet3_edges, radius=FILLET3_R - 0.0001)  # a hair under: the kernel refuses the full size

    # Sketch15 → Cut-Extrude8 (cut, through all)
    with BuildSketch(Plane(origin=(0, 26.000000000000004, 0), x_dir=(1, 0, 0), z_dir=(0, 1, 0))):
        with Locations(Location((-25, 20.000000000000004, 0), (0, 0, 270))):
            Circle(SKETCH15_R)
        with Locations(Location((25, 20.000000000000004, 0), (0, 0, 90))):
            Circle(SKETCH15_R)
        with Locations(Location((25, -20.000000000000004, 0), (0, 0, 270))):
            Circle(SKETCH15_R)
        with Locations(Location((-25, -20.000000000000004, 0), (0, 0, 90))):
            Circle(SKETCH15_R)
    extrude(amount=-CUT_EXTRUDE8_DEPTH, mode=Mode.SUBTRACT)

    # Sketch20 → Cut-Extrude11 (cut)
    with BuildSketch(Plane(origin=(0, 4, 0), x_dir=(1, 0, 0), z_dir=(0, 1, 0))):
        Rectangle(SKETCH20_W, SKETCH20_H)
    extrude(amount=-CUT_EXTRUDE11_DEPTH, mode=Mode.SUBTRACT)

    # Sketch21 → Boss-Extrude5 (add)
    with BuildSketch(Plane.XY.offset(42.499999999999986)):
        with Locations(Location((0, 18, 0), (0, 0, 180))):
            Circle(SKETCH21_R)
    boss_extrude5 = extrude(amount=BOSS_EXTRUDE5_DEPTH)

    # Mirror9: Boss-Extrude5 across plane
    add(boss_extrude5.mirror(Plane.XY))

    # Fillet5
    fillet5_edges = [part_2.edges().sort_by_distance(p)[0] for p in [
        (3.75, 17.999999999999996, 42.499999999999986),
        (3.75, 17.999999999999996, -42.499999999999986),
    ]]
    fillet(fillet5_edges, radius=FILLET5_R)

    # Sketch24 → Cut-Extrude12 (cut)
    with BuildSketch(Plane(origin=(0, 29, 0), x_dir=(1, 0, 0), z_dir=(0, 1, 0))):
        with Locations((0, 38.999999999999986)):
            Rectangle(SKETCH24_W, SKETCH24_H)
    extrude(amount=-CUT_EXTRUDE12_DEPTH, mode=Mode.SUBTRACT)


solid = part_2.part
